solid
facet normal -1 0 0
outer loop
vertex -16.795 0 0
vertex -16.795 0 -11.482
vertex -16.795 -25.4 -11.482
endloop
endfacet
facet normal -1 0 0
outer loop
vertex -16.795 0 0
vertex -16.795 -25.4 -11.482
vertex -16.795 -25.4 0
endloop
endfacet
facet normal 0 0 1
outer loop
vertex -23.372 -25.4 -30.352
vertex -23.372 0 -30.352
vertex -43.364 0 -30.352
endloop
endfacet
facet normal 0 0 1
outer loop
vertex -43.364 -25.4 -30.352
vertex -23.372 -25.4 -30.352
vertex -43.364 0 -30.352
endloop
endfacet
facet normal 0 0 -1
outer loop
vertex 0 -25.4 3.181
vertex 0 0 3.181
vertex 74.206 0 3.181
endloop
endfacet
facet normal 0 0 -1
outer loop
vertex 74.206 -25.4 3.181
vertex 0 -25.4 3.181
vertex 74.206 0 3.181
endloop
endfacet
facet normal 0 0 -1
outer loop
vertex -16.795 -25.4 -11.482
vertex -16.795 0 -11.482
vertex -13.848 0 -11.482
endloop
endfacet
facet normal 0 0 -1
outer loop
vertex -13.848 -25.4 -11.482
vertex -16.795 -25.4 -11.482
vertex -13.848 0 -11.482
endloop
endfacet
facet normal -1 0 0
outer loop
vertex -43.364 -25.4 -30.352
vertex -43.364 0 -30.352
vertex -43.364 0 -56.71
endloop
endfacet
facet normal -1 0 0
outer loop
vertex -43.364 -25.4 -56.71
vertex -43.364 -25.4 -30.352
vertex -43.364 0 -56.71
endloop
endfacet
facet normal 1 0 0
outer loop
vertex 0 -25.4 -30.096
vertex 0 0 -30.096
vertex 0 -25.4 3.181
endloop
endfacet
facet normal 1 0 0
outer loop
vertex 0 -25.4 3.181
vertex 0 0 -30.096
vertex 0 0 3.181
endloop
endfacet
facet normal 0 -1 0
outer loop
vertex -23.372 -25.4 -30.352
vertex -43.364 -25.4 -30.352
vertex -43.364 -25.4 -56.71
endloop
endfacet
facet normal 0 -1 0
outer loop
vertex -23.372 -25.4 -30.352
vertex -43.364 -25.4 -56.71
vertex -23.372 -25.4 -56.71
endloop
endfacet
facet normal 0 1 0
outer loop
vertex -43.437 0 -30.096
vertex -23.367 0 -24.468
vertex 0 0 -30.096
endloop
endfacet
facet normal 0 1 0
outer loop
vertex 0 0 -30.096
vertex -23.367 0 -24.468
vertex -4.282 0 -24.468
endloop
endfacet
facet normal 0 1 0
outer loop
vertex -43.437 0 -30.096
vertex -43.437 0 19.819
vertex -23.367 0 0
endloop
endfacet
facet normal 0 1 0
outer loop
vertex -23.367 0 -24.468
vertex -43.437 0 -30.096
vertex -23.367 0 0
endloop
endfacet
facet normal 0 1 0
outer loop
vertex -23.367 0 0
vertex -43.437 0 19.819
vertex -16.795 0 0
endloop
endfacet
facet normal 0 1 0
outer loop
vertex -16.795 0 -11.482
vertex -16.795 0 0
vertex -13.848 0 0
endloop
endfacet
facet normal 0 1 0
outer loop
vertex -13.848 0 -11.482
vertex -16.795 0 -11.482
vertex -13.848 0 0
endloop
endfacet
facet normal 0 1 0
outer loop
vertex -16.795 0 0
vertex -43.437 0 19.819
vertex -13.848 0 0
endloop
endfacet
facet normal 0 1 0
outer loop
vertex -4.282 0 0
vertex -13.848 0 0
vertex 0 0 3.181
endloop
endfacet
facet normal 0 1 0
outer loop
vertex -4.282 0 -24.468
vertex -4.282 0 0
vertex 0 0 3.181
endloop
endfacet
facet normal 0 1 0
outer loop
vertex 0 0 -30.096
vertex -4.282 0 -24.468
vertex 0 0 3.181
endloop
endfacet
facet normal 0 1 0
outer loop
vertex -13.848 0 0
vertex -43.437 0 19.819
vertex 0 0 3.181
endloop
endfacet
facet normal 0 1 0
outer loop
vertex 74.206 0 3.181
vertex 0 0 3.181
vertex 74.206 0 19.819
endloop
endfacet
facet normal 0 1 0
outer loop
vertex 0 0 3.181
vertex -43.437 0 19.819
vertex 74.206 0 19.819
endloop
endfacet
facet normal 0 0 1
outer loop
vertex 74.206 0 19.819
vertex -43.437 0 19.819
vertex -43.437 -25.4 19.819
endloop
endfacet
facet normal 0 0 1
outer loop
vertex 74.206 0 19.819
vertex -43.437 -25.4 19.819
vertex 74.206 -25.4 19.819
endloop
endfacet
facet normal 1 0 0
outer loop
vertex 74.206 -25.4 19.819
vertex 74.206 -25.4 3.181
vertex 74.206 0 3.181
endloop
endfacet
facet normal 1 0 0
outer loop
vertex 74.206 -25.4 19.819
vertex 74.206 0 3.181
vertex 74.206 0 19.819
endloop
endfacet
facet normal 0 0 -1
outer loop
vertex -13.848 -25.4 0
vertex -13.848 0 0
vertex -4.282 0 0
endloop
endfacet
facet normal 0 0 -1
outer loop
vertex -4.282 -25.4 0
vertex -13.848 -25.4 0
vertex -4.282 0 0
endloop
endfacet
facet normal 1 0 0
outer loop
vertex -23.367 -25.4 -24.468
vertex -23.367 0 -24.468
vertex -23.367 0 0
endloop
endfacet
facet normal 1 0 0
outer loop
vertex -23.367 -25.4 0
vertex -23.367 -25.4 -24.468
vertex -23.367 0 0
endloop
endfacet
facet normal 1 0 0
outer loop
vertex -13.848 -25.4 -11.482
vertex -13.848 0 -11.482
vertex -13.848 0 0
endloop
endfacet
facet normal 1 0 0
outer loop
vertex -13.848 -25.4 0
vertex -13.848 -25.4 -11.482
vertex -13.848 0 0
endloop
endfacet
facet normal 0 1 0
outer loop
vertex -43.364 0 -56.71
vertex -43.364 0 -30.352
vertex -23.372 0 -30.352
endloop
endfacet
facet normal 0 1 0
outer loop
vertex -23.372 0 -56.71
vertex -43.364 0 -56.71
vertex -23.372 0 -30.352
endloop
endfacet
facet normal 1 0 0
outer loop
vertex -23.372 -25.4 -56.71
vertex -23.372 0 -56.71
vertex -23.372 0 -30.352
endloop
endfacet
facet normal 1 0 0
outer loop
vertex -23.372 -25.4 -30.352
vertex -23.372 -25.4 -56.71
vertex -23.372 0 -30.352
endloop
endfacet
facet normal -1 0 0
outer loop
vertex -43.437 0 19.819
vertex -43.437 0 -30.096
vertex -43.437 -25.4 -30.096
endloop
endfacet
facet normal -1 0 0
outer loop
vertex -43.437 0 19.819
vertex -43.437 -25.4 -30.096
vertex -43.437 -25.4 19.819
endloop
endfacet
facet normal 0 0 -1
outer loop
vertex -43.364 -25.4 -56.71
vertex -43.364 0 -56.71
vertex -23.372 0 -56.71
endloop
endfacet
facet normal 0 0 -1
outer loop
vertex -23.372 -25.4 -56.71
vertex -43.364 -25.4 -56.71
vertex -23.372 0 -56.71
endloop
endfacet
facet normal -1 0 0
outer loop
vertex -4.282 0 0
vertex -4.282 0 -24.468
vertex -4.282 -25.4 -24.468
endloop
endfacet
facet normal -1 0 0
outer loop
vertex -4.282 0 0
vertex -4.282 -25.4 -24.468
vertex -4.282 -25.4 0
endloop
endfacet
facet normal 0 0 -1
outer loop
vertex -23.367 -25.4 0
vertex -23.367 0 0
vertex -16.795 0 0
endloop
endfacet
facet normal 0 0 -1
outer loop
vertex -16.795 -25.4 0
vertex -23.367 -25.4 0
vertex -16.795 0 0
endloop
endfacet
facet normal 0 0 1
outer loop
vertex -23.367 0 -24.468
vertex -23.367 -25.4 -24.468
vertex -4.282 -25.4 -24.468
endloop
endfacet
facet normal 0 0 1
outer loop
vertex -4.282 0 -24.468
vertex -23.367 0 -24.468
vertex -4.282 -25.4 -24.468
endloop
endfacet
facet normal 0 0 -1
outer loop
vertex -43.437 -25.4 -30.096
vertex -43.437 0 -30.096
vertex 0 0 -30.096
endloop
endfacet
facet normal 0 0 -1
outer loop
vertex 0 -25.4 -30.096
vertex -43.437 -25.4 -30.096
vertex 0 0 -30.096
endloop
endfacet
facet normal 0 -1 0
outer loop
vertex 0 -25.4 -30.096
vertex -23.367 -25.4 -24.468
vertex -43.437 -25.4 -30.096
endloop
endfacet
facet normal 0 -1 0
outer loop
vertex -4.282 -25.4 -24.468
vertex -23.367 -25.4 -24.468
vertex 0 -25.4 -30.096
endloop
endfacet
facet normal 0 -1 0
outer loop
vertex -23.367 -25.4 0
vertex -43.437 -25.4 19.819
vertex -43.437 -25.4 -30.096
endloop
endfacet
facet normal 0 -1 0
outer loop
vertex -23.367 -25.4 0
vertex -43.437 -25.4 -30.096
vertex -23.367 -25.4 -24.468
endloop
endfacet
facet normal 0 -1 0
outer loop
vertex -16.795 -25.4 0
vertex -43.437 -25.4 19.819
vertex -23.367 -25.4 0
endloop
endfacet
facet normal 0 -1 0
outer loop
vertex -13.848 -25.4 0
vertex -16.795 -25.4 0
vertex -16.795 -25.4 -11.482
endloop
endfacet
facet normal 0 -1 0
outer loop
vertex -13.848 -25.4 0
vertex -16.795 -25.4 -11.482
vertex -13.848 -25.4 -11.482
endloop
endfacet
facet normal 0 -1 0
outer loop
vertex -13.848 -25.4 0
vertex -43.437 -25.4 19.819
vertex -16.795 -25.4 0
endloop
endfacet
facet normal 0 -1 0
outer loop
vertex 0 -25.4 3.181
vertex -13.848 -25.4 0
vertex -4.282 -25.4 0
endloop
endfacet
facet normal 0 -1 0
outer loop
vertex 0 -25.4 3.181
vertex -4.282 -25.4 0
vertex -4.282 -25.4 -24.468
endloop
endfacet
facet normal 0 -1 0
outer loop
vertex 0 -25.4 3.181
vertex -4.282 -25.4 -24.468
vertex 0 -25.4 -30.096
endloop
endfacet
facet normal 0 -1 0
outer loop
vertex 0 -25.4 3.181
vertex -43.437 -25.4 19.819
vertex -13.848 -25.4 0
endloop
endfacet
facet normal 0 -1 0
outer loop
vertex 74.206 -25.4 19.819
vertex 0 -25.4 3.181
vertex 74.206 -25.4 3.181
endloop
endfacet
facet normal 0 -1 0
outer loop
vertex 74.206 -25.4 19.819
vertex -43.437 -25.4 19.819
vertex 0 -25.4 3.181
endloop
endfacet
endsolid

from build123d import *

# Parameters (mm, degrees)
F0_W      = 119.1671006382
F0_H      = 49.9144960195
F2_DEPTH  = 25.4
F0_W_2    = 0.7340870798
F0_H_2    = 0.2446807921
F1_W      = 75.4855722189
F1_H      = 33.2763304468
F3_DEPTH  = 25.654
F4_DEPTH  = 1.524
F5_W      = 19.0849574283
F5_H      = 24.4678892195
F6_DEPTH  = 52.324
F8_DEPTH  = 25.4
F9_W      = 2.946536988
F9_H      = 13.5136300232
F10_DEPTH = 25.4


with BuildPart() as f2:
    # F0 (on Front) → F2 (new body)
    with BuildSketch(Plane.XZ):
        with Locations((16.1467138678, -5.1382565871)):
            Rectangle(F0_W, F0_H)
    extrude(amount=F2_DEPTH)

    # F1 (on Front) → F3 (cut)
    with BuildSketch(Plane.XZ):
        with Locations((37.7427861094, -13.4573393734)):
            Rectangle(F1_W, F1_H)
    extrude(amount=F3_DEPTH, mode=Mode.SUBTRACT)

    # F4 (cut): a face of the model
    f4_faces = [f2.faces().sort_by_distance(p)[0] for p in [
        (75.7302641869, -12.7, -5.1382565871),
    ]]
    extrude(f4_faces, amount=-F4_DEPTH, mode=Mode.SUBTRACT)

    # F5 (on Front) → F6 (cut)
    with BuildSketch(Plane.XZ):
        with Locations((-13.8243581168, -12.2339446098)):
            Rectangle(F5_W, F5_H)
    extrude(amount=F6_DEPTH, mode=Mode.SUBTRACT)

    # F9 (on Front) → F10 (join)
    with BuildSketch(Plane.XZ):
        with Locations((-15.3217632324, -4.7247168841)):
            Rectangle(F9_W, F9_H)
    extrude(amount=F10_DEPTH)


with BuildPart() as f2b:
    # F0 (on Front) → F2, piece 2 (new body)
    with BuildSketch(Plane.XZ):
        with Locations((-35.4842077941, -49.0581188351)):
            Rectangle(F0_W_2, F0_H_2)
    extrude(amount=F2_DEPTH)

    # F7 (on Front) → F8 (join)
    with BuildSketch(Plane.XZ):
        Polygon((-23.3724564314, -39.6527908742), (-23.3724564314, -30.3523428738), (-43.3641932905, -30.3523428738), (-43.3641932905, -56.7100383341), (-23.3724564314, -56.7100383341), (-23.3724564314, -41.9807769358), align=None)
    extrude(amount=F8_DEPTH)


solid = Compound([f2.part, f2b.part])
